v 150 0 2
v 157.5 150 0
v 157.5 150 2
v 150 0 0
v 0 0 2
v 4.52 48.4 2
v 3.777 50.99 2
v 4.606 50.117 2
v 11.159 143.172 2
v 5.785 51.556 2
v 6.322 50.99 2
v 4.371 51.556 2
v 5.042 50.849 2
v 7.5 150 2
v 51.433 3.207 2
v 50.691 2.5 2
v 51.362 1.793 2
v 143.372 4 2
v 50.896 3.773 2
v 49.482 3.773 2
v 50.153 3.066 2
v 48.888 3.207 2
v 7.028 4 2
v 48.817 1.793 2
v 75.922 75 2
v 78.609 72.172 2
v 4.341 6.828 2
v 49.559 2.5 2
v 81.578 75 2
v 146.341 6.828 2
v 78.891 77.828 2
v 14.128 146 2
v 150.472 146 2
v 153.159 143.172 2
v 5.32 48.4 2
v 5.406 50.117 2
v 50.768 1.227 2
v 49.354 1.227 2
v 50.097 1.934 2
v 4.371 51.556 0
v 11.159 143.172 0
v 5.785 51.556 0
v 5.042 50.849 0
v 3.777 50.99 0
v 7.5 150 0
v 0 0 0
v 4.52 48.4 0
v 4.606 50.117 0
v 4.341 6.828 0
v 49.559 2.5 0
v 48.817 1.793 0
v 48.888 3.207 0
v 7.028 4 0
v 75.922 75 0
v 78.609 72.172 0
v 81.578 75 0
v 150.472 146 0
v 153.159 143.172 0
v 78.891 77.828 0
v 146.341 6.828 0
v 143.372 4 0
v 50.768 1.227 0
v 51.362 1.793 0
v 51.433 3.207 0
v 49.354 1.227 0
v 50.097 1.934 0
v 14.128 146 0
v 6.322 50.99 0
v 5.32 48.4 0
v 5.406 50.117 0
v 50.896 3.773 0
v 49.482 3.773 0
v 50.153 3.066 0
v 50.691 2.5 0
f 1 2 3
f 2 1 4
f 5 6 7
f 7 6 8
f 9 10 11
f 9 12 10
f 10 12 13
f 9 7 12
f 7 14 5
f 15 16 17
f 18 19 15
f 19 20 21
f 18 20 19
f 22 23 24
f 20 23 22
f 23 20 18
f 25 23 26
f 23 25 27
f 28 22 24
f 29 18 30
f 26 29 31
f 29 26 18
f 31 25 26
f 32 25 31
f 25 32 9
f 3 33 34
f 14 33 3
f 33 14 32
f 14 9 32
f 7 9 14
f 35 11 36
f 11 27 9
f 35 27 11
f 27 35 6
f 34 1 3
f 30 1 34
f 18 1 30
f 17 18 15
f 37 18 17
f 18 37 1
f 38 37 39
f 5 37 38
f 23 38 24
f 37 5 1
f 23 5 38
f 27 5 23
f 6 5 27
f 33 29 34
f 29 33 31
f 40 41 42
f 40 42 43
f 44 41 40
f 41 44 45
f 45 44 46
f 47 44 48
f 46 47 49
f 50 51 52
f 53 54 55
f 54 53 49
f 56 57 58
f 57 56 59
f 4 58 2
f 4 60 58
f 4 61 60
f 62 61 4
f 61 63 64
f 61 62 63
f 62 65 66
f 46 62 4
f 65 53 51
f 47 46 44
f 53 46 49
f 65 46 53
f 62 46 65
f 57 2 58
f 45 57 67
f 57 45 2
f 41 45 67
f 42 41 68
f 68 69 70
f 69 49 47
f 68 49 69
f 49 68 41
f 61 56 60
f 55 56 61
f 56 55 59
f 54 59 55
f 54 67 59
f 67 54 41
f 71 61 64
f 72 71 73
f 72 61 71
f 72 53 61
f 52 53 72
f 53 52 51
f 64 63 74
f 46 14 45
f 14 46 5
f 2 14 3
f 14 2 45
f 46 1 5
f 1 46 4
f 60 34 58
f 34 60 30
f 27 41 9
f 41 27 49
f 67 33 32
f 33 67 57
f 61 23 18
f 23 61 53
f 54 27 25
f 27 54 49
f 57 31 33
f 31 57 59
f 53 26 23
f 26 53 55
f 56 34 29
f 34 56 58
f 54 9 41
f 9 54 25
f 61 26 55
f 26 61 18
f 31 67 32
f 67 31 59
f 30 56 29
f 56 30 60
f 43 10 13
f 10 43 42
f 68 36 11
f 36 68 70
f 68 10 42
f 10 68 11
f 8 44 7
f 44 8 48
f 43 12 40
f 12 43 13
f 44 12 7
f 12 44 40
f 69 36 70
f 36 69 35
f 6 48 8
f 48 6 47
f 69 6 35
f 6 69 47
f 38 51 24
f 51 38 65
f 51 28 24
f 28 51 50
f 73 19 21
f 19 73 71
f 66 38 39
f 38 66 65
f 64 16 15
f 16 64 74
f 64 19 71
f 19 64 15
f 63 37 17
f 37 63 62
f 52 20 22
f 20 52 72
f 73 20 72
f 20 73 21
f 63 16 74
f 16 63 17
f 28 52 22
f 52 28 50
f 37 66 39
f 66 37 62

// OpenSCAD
size = 150;
h = 2;
w = 4;
//fontLine = 1;
sqrt2 = sqrt(2);
module main()
{
    intersection()
    {
        union()
        {
            difference()
            {
                cube([size, size, h]);
                translate([w,w,0]) cube([size - 2 * w, size - 2 * w, h]);
            }
            translate([w/2/sqrt2,-w/2/sqrt2,0]) rotate([0,0,45])  cube([size * sqrt2, w, h]);
            translate([size + w/2/sqrt2,w/2/sqrt2,0]) rotate([0,0,180-45])  cube([size * sqrt2, w, h]);
        }
        cube([size, size, h]);
    }
}
module xSign()
{
    union()
    {
        rotate([0,0,45]) translate([0,0,h/2]) cube([3.5,1,h], center = true);
        rotate([0,0,-45]) translate([0,0,h/2]) cube([3.5,1,h], center = true);
    }
}
module ySign()
{
    translate([1/2/sqrt2,0,0]) rotate([0,0,45]) cube([3.5/2,1,h]);
    translate([1/2/sqrt2,1/sqrt2,0])rotate([0,0,135]) cube([3.5/2,1,h]);
    translate([-0.5,-2, 0]) cube([1,3,h]);
}
multmatrix(m = [[1,0.05,0,0], [0,1,0,0], [0,0,1,0]]) difference()
{
    main();
    translate([2.5, size/3, 0])scale([0.8,0.8,1]) ySign();
    translate([size/3, 2.5, 0]) scale([0.8,0.8,1]) xSign();
}
